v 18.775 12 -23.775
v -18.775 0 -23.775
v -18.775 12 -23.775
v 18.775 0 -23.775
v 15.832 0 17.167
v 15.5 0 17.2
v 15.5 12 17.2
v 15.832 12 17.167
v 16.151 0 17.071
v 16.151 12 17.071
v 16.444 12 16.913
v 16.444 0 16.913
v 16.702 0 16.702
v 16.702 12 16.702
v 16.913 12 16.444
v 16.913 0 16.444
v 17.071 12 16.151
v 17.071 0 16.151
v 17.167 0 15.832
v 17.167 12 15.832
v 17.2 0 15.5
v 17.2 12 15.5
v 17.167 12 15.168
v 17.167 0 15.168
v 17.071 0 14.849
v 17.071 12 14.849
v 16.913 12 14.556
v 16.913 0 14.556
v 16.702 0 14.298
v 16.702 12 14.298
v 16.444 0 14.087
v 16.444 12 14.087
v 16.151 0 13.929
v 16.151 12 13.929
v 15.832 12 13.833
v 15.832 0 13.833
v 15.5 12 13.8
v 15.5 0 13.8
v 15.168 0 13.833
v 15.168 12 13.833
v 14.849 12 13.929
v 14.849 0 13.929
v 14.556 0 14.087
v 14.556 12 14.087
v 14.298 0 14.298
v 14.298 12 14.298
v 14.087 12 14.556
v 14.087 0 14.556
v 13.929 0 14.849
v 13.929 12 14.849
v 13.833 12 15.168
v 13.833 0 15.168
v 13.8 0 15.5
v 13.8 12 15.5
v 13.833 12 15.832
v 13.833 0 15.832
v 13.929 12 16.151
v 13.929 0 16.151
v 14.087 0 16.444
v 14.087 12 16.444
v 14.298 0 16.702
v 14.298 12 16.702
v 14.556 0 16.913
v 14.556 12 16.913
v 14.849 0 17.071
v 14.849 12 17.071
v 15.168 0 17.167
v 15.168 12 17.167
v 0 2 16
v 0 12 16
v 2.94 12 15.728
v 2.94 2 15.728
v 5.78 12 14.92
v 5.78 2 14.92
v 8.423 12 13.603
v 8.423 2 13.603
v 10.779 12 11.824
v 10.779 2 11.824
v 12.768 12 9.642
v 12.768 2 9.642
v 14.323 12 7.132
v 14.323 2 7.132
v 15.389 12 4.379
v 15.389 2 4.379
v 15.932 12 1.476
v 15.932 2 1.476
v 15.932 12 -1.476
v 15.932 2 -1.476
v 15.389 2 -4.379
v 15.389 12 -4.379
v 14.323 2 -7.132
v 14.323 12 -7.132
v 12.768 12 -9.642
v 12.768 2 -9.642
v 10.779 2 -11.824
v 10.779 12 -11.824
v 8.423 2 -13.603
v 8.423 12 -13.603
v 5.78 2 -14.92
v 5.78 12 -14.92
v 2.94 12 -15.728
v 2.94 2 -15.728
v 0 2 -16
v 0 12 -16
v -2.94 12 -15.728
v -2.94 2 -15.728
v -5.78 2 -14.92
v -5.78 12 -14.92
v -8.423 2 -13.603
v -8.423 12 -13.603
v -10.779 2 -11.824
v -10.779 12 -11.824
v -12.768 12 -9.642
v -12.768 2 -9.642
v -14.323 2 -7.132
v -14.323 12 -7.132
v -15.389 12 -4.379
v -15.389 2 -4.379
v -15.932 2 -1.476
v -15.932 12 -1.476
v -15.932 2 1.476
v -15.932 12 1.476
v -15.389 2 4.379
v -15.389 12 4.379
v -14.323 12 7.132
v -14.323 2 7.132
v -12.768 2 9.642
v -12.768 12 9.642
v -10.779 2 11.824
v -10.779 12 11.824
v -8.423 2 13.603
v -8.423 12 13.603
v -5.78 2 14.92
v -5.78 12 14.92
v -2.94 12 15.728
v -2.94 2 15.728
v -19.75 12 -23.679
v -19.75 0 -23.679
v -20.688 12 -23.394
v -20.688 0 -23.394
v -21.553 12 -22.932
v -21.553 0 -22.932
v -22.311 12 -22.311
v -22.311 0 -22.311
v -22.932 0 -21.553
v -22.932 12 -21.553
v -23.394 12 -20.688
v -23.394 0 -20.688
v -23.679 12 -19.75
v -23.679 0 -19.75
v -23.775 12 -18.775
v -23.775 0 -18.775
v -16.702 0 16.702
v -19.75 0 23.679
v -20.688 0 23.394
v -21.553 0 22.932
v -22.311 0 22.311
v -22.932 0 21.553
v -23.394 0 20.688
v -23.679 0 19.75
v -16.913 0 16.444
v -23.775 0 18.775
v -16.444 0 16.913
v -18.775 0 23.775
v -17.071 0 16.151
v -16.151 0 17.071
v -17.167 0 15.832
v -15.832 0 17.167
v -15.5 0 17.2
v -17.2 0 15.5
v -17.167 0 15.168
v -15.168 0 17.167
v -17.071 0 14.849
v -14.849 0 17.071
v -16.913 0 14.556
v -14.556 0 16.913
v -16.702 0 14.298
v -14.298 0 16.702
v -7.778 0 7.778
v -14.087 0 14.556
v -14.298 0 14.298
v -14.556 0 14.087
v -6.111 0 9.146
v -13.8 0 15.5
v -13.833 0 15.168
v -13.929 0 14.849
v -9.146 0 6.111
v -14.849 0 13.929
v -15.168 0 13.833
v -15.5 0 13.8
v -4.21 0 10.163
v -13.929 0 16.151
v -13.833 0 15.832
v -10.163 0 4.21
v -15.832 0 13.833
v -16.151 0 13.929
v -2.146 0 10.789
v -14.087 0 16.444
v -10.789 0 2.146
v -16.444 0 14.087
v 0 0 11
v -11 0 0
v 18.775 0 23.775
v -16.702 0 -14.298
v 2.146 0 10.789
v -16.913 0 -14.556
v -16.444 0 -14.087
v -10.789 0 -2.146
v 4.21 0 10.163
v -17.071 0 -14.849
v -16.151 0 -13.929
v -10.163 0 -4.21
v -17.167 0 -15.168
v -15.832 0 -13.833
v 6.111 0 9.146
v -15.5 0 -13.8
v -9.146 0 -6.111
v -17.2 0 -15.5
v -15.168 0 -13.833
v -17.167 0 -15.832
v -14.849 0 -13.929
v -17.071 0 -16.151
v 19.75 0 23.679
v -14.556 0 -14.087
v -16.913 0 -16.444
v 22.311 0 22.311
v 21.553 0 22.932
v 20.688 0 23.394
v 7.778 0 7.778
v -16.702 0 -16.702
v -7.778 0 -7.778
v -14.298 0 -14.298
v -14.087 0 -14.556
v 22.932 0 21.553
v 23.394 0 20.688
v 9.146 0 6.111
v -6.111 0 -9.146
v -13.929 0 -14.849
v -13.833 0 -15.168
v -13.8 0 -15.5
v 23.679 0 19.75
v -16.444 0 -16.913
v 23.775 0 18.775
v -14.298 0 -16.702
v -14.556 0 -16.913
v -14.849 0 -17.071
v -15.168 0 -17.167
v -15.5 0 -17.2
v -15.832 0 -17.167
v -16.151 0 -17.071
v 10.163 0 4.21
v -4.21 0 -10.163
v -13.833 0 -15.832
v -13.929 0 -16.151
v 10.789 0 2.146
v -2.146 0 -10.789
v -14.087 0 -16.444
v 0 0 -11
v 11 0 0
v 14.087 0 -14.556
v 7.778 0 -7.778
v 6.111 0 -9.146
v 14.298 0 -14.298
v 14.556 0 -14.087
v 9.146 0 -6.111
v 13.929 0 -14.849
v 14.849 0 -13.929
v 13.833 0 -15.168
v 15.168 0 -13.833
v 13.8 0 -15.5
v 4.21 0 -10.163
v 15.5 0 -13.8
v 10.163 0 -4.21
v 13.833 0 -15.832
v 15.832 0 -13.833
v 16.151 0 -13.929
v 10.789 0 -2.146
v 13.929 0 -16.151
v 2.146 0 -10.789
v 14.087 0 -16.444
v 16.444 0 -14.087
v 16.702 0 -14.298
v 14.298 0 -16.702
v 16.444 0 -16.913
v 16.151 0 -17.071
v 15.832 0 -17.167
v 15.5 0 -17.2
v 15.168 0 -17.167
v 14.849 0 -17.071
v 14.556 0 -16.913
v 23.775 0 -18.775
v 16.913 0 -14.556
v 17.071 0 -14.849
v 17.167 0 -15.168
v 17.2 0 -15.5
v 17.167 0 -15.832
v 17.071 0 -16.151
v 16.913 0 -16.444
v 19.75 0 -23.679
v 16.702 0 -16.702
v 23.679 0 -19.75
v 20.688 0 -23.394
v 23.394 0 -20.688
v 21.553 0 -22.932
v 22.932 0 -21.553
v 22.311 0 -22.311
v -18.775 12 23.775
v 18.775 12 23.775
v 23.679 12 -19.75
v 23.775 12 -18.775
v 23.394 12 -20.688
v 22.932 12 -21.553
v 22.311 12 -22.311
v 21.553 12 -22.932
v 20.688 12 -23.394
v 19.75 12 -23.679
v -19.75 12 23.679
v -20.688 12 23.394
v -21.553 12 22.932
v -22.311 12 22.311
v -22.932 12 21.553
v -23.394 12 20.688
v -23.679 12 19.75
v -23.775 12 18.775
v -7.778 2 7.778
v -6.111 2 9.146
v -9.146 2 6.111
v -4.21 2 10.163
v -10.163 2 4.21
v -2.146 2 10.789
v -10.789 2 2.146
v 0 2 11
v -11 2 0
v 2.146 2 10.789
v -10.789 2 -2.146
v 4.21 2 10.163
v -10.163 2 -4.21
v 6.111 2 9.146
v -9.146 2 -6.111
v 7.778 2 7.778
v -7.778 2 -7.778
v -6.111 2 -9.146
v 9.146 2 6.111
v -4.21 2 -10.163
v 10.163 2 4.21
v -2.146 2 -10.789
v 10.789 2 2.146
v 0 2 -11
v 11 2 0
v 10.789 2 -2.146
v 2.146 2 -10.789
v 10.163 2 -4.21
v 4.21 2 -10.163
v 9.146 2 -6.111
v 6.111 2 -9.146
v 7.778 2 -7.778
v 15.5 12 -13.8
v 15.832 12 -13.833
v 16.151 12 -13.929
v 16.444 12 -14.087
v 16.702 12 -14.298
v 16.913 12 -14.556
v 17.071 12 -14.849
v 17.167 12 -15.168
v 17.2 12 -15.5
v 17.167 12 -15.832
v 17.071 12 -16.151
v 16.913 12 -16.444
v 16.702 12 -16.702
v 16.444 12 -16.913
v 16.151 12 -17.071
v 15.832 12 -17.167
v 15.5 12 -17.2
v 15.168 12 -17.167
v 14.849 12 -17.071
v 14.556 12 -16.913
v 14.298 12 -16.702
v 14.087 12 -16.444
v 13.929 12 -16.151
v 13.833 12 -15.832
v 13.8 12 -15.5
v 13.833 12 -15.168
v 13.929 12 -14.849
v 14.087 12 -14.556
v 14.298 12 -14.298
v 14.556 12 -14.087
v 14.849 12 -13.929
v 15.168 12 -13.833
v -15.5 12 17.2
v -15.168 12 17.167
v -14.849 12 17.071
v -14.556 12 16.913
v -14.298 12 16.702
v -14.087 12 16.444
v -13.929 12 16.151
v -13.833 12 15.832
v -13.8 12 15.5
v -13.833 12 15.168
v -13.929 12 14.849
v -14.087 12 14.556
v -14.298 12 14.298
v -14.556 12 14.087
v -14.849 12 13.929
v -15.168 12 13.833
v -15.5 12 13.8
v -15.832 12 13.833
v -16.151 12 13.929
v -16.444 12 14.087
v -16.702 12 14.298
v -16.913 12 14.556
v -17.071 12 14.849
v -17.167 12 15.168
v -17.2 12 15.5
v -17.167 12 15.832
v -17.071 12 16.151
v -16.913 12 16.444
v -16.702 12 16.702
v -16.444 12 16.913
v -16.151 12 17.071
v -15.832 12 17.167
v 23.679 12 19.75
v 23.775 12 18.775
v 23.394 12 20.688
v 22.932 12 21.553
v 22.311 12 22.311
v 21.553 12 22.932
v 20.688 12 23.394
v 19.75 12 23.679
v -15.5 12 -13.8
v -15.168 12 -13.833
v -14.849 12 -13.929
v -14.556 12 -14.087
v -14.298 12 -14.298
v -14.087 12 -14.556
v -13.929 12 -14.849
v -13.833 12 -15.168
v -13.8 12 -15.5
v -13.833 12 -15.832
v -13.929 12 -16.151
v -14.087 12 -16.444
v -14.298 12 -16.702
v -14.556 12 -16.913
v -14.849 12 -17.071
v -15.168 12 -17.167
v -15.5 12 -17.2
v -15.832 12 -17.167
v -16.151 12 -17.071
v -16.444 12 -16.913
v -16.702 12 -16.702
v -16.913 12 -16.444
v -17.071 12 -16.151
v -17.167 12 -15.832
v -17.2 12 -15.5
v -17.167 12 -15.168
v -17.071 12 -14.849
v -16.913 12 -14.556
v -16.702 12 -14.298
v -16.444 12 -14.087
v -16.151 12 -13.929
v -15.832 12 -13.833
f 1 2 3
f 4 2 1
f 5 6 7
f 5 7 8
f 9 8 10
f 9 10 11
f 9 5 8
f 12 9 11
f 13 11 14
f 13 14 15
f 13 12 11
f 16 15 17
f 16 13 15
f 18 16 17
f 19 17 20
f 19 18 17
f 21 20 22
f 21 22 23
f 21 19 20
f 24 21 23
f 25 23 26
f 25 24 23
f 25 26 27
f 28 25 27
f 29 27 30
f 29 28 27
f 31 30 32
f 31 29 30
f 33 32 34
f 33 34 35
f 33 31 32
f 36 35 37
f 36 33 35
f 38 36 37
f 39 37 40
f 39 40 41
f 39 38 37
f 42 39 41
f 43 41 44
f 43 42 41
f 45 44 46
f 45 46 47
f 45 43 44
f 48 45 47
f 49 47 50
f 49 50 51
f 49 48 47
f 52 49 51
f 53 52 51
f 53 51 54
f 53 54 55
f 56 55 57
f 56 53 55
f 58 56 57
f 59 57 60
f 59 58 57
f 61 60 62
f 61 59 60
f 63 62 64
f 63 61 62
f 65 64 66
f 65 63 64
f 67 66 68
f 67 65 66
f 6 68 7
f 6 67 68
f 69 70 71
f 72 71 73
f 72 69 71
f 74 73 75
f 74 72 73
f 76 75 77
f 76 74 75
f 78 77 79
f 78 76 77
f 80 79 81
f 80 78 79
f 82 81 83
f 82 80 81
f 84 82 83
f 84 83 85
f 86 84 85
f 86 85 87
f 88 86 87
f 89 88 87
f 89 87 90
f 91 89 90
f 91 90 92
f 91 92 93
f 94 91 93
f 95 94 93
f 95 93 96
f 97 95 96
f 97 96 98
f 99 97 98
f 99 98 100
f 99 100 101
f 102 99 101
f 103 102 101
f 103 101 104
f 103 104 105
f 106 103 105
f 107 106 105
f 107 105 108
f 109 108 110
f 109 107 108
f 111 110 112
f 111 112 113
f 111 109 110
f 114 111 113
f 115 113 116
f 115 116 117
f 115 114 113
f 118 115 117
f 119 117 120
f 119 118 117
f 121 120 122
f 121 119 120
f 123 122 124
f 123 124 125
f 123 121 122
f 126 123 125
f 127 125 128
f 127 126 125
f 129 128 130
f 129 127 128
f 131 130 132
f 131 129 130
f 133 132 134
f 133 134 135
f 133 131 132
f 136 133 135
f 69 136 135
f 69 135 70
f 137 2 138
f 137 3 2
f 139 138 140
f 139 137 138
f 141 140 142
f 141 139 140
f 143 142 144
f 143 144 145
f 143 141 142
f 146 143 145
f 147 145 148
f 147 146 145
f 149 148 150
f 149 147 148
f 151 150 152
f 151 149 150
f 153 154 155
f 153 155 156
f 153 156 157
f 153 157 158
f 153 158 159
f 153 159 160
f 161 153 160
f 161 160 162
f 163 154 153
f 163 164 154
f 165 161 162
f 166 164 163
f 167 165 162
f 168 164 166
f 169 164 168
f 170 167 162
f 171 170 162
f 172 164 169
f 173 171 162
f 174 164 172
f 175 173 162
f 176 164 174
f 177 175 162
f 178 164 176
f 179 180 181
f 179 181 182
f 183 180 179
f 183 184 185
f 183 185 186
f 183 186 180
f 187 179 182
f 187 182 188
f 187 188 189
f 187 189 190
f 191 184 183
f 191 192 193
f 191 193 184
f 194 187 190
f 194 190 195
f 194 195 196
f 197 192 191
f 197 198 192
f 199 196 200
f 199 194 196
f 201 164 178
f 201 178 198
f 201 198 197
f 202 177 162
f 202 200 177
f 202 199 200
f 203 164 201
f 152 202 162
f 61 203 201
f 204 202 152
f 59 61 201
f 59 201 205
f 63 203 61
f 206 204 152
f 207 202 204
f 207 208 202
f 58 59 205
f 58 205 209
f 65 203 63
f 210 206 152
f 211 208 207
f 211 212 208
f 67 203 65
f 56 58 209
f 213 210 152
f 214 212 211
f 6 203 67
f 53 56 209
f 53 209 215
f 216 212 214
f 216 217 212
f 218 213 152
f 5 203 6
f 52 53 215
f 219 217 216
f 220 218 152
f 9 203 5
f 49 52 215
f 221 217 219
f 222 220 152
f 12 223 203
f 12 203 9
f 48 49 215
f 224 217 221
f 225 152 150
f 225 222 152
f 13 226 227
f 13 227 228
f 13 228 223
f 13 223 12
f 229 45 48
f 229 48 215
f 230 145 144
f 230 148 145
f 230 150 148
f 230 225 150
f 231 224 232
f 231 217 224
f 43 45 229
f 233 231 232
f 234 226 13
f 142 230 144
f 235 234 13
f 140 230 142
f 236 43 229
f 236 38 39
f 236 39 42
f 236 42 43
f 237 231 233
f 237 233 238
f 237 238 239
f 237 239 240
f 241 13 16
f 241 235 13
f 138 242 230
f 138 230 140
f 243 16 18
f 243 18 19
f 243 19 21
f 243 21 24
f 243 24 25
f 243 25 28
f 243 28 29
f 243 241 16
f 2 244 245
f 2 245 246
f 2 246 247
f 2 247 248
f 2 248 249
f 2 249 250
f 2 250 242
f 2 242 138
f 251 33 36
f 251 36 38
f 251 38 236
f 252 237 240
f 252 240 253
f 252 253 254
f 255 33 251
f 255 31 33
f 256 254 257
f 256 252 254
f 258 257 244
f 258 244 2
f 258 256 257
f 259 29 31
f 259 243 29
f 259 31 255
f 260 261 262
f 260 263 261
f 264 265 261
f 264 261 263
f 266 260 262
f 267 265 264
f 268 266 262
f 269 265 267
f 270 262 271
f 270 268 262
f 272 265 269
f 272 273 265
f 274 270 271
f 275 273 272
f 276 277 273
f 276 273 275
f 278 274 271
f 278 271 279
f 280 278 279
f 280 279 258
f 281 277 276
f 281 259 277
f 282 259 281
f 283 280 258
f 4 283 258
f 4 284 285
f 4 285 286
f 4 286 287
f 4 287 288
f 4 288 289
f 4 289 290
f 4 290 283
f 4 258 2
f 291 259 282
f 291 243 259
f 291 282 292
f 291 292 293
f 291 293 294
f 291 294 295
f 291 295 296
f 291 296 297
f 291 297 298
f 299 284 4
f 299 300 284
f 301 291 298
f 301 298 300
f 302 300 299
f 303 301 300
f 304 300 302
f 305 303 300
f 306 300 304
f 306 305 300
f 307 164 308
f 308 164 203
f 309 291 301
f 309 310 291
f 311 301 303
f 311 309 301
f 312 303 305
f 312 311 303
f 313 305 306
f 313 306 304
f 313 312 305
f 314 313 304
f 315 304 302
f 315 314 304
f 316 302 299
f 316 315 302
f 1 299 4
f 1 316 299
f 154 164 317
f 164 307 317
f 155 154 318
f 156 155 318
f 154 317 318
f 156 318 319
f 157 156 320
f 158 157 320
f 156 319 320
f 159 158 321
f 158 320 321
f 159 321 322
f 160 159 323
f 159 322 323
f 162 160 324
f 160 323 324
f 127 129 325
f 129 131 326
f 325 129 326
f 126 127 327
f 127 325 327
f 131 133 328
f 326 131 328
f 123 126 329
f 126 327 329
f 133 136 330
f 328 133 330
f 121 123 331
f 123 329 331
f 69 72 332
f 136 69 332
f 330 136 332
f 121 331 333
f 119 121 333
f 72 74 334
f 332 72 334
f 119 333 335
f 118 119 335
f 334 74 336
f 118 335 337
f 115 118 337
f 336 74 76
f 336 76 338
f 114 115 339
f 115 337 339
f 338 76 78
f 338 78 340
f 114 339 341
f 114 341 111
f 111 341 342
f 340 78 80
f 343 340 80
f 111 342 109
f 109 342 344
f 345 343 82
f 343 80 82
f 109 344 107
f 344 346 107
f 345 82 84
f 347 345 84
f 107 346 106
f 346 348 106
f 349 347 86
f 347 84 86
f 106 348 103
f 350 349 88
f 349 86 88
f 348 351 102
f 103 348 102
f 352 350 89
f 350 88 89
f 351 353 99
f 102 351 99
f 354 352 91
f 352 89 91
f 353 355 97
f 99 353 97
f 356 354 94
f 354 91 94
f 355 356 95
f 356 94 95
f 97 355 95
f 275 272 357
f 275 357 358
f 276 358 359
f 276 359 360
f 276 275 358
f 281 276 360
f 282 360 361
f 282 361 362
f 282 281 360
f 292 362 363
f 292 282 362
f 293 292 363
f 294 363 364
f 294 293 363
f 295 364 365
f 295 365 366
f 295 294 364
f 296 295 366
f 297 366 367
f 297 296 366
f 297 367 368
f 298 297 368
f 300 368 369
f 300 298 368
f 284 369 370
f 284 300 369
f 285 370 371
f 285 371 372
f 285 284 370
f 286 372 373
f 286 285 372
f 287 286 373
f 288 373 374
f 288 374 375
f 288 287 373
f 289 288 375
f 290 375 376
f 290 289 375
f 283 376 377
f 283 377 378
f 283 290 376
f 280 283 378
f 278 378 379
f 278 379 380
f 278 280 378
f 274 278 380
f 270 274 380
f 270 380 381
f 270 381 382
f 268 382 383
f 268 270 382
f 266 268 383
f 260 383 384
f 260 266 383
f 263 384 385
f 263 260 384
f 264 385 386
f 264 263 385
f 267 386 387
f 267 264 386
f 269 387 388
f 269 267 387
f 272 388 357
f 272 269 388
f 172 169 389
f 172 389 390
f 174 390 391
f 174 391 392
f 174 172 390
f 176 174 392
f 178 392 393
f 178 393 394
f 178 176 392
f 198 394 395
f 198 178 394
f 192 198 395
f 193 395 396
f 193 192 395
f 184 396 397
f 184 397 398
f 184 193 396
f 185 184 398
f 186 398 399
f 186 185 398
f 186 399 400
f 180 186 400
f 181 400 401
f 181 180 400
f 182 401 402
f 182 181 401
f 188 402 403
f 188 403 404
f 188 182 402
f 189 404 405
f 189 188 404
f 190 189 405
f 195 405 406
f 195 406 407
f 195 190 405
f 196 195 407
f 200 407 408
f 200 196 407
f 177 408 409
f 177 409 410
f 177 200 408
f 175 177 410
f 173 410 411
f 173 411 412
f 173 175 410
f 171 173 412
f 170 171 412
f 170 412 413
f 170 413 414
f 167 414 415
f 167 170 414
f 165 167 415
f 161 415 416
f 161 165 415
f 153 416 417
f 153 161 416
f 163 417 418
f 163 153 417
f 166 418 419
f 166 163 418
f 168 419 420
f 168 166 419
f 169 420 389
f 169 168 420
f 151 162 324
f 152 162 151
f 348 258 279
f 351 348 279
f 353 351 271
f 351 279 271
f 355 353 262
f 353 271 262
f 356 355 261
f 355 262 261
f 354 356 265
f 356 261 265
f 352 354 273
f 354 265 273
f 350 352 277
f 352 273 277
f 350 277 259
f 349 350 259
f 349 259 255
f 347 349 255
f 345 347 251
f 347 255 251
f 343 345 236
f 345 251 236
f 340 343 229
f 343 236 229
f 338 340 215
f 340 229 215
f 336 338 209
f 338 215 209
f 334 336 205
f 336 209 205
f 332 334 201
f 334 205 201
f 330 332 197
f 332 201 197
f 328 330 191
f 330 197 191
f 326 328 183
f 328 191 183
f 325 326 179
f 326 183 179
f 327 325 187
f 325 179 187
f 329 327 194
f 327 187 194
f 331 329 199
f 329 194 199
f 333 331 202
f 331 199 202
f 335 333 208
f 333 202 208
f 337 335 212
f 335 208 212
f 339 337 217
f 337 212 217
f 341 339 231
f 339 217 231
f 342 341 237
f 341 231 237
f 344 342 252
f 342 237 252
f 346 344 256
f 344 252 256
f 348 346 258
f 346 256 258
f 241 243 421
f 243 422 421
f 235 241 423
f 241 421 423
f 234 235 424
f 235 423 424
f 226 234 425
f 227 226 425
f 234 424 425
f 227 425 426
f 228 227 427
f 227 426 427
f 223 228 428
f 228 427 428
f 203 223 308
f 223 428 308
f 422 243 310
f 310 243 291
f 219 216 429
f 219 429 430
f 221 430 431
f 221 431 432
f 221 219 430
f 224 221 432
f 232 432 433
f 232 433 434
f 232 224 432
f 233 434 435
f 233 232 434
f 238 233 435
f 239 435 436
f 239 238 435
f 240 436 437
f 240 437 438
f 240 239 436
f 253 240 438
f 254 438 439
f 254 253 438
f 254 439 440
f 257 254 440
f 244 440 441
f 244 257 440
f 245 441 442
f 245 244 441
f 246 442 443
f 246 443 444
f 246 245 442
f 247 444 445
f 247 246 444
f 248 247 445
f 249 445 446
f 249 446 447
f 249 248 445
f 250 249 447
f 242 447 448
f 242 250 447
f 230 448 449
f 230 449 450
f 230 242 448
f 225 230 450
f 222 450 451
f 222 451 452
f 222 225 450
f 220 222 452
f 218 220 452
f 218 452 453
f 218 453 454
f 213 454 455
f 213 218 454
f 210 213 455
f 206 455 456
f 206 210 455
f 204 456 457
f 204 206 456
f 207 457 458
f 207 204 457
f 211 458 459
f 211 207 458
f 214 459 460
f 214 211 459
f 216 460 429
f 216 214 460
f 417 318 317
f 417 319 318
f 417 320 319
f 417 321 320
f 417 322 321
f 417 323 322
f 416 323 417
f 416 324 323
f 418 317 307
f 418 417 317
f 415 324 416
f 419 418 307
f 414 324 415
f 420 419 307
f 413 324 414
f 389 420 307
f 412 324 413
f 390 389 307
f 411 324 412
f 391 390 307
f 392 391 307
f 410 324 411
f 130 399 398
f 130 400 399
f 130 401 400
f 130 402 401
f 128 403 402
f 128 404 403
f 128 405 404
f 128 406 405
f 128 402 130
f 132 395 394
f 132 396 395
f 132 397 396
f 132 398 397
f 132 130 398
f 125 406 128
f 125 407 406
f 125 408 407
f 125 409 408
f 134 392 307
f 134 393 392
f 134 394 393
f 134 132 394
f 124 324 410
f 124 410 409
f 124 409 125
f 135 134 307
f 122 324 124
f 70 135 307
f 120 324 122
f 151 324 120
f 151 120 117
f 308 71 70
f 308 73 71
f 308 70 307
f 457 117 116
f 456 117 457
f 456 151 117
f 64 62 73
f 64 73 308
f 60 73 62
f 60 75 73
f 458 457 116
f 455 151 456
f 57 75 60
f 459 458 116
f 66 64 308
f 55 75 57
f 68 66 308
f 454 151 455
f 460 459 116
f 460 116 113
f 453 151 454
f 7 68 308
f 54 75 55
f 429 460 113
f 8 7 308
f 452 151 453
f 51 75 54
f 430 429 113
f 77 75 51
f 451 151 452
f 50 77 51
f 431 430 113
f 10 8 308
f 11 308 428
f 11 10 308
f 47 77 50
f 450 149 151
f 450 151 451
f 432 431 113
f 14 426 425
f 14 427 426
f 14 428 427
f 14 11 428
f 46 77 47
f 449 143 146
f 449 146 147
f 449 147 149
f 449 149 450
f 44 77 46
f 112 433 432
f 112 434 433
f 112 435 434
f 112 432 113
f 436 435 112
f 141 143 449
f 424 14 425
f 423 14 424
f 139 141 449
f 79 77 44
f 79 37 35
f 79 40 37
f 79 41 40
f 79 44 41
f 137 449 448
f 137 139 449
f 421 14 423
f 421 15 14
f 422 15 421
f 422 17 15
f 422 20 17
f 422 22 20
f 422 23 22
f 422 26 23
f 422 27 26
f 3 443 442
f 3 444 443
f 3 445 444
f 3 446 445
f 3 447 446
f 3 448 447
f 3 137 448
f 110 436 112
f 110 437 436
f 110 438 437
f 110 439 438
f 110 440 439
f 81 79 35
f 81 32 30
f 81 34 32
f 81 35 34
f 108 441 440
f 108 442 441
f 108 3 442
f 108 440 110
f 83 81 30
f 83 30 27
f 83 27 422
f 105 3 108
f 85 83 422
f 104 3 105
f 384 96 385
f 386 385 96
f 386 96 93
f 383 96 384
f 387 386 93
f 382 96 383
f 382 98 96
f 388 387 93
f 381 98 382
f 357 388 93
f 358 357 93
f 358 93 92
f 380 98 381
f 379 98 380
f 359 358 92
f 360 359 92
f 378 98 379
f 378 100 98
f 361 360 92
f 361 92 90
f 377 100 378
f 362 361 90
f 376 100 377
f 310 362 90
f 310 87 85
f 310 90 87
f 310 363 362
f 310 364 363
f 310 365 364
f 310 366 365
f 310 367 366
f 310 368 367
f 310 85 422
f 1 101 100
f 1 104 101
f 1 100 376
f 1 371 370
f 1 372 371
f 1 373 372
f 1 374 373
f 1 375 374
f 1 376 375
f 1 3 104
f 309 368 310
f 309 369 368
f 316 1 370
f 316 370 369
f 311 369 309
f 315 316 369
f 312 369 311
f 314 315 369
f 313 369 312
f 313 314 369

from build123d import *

# Parameters (mm, degrees)
SKETCH1_W           = 47.55
SKETCH1_H           = 47.55
SKETCH1_R           = 1.7
SKETCH1_R_2         = 16
BOSS_EXTRUDE1_DEPTH = 12
SKETCH2_R           = 16
SKETCH2_R_2         = 11
BOSS_EXTRUDE2_DEPTH = 2
FILLET1_R           = 5


with BuildPart() as part:
    # Sketch1 → Boss-Extrude1 (new body)
    with BuildSketch(Plane(origin=(0, 0, 0), x_dir=(1, 0, 0), z_dir=(0, 1, 0))):
        Rectangle(SKETCH1_W, SKETCH1_H)
        with Locations(Location((-15.5, 15.5, 0), (0, 0, 270))):
            Circle(SKETCH1_R, mode=Mode.SUBTRACT)
        with Locations(Location((15.5, 15.5, 0), (0, 0, 270))):
            Circle(SKETCH1_R, mode=Mode.SUBTRACT)
        with Locations(Location((15.5, -15.5, 0), (0, 0, 270))):
            Circle(SKETCH1_R, mode=Mode.SUBTRACT)
        with Locations(Location((-15.5, -15.5, 0), (0, 0, 270))):
            Circle(SKETCH1_R, mode=Mode.SUBTRACT)
        with Locations(Location((0, 0, 0), (0, 0, 270))):
            Circle(SKETCH1_R_2, mode=Mode.SUBTRACT)
    extrude(amount=BOSS_EXTRUDE1_DEPTH)

    # Sketch2 → Boss-Extrude2 (add)
    with BuildSketch(Plane.XZ):
        with Locations(Location((0, 0, 0), (0, 0, 270))):
            Circle(SKETCH2_R)
        with Locations(Location((0, 0, 0), (0, 0, 270))):
            Circle(SKETCH2_R_2, mode=Mode.SUBTRACT)
    extrude(amount=-BOSS_EXTRUDE2_DEPTH)

    # Fillet1
    fillet1_edges = [part.edges().sort_by_distance(p)[0] for p in [
        (23.775, 6, 23.775),
        (-23.775, 6, 23.775),
        (-23.775, 6, -23.775),
        (23.775, 6, -23.775),
    ]]
    fillet(fillet1_edges, radius=FILLET1_R)


solid = part.part
